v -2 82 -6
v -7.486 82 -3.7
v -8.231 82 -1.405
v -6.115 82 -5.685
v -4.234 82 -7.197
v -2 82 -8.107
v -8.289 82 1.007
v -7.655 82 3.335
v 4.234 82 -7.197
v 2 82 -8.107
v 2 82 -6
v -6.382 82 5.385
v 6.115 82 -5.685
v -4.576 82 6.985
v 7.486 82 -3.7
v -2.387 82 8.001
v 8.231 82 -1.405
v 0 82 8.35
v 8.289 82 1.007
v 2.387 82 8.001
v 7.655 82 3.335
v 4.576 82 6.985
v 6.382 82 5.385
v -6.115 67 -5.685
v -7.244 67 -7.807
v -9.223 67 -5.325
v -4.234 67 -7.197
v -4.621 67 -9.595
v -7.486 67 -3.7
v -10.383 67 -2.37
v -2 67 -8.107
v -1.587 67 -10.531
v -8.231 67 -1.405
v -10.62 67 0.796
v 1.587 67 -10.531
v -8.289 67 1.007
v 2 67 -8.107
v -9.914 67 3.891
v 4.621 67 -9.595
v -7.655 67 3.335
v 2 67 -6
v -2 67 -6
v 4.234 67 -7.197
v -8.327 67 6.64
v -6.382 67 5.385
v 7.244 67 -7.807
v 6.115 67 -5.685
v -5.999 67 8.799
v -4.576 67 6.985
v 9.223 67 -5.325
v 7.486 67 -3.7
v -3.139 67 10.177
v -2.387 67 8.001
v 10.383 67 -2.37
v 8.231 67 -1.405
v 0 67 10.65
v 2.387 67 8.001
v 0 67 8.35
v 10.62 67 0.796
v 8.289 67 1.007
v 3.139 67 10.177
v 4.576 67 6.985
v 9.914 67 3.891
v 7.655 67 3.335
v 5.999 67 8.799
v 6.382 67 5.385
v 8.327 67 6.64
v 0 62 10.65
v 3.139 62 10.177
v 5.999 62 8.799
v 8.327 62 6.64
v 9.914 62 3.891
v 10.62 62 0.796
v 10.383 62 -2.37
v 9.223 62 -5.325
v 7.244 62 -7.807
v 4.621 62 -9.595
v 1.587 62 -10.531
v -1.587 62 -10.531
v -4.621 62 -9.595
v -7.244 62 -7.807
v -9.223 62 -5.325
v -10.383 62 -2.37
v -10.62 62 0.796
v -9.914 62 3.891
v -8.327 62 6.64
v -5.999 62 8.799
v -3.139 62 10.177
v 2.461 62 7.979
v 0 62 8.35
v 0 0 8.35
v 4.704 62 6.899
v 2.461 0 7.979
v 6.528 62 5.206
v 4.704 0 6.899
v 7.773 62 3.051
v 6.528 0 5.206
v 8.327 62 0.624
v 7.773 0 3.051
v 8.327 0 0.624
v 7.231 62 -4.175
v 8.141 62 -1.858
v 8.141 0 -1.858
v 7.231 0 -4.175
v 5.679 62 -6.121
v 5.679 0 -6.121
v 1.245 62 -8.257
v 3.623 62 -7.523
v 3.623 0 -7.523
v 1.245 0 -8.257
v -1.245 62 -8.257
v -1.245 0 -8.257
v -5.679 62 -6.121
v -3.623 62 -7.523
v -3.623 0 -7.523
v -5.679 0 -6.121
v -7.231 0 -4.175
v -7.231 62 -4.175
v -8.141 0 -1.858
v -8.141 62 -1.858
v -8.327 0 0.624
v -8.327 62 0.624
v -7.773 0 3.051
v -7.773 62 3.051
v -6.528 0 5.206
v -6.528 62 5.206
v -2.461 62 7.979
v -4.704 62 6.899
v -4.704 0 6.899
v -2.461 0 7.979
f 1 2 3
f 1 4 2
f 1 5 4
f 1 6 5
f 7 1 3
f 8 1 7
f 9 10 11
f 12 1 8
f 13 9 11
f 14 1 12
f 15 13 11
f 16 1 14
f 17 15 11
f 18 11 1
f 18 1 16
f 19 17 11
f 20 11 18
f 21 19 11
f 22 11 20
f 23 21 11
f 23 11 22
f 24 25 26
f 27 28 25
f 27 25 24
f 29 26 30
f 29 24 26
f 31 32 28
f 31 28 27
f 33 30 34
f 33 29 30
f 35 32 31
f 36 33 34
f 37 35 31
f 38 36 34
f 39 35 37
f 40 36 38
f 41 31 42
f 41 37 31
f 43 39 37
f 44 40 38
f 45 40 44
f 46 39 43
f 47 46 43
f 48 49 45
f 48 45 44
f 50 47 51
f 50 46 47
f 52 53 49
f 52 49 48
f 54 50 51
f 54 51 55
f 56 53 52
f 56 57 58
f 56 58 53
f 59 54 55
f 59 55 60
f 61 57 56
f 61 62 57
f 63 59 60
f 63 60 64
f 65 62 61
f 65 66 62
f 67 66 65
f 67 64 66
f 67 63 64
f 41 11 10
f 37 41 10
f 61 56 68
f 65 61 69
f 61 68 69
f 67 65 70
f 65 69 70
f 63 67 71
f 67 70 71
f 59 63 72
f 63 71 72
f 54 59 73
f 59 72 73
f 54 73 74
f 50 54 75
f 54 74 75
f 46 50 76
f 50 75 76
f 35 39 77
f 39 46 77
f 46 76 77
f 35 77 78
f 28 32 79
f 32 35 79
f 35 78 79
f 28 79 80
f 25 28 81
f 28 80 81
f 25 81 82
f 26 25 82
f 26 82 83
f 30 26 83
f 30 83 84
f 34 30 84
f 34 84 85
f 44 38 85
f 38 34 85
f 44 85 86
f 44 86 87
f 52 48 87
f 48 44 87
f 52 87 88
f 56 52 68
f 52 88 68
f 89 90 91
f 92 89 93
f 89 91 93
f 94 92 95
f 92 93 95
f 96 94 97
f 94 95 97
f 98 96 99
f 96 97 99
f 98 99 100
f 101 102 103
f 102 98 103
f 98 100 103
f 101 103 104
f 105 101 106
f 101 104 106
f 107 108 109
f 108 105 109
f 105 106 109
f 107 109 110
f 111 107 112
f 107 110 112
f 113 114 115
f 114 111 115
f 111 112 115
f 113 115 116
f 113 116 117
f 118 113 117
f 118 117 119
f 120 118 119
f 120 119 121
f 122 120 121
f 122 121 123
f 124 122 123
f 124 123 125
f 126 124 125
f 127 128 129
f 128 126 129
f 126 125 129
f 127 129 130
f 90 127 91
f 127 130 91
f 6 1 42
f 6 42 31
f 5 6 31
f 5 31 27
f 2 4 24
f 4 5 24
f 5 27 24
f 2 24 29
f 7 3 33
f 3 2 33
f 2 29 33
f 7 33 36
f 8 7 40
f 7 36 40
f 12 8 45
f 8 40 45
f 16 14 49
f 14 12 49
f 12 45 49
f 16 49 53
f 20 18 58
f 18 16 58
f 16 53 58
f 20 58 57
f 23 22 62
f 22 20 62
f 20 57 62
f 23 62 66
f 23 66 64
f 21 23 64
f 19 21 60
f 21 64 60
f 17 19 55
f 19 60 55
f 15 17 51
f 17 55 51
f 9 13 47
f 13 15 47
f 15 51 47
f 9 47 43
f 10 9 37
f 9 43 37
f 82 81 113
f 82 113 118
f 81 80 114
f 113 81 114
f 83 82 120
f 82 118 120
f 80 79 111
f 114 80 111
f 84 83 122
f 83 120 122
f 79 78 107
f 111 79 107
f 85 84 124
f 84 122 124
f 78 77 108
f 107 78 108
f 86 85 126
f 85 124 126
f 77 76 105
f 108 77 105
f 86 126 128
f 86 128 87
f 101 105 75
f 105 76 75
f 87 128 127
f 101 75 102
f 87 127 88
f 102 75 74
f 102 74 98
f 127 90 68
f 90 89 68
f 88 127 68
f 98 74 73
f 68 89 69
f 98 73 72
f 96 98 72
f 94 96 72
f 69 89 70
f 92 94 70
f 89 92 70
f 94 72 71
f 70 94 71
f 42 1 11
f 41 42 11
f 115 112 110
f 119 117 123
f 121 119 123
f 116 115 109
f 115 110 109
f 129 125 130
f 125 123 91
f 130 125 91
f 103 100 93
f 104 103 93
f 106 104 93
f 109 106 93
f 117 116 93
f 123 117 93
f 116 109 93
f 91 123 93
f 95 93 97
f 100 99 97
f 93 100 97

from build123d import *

# Parameters (mm, degrees)
SKETCH1_R           = 8.35
BOSS_EXTRUDE1_DEPTH = 82
SKETCH2_R           = 10.65
BOSS_EXTRUDE2_DEPTH = 5
SKETCH3_W           = 4
SKETCH3_H           = 8.442622751
CUT_EXTRUDE1_DEPTH  = 15


with BuildPart() as part:
    # Sketch1 → Boss-Extrude1 (new body)
    with BuildSketch(Plane(origin=(0, 0, 0), x_dir=(1, 0, 0), z_dir=(0, 1, 0))):
        with Locations(Location((0, 0, 0), (0, 0, 270))):
            Circle(SKETCH1_R)
    extrude(amount=BOSS_EXTRUDE1_DEPTH)

    # Sketch2 → Boss-Extrude2 (add)
    with BuildSketch(Plane(origin=(0, 62, 0), x_dir=(1, 0, 0), z_dir=(0, 1, 0))):
        with Locations(Location((0, 0, 0), (0, 0, 270))):
            Circle(SKETCH2_R)
    extrude(amount=BOSS_EXTRUDE2_DEPTH)

    # Sketch3 → Cut-Extrude1 (cut)
    with BuildSketch(Plane(origin=(0, 82, 0), x_dir=(1, 0, 0), z_dir=(0, 1, 0))):
        with Locations((0, 10.221311376)):
            Rectangle(SKETCH3_W, SKETCH3_H)
    extrude(amount=-CUT_EXTRUDE1_DEPTH, mode=Mode.SUBTRACT)


solid = part.part
